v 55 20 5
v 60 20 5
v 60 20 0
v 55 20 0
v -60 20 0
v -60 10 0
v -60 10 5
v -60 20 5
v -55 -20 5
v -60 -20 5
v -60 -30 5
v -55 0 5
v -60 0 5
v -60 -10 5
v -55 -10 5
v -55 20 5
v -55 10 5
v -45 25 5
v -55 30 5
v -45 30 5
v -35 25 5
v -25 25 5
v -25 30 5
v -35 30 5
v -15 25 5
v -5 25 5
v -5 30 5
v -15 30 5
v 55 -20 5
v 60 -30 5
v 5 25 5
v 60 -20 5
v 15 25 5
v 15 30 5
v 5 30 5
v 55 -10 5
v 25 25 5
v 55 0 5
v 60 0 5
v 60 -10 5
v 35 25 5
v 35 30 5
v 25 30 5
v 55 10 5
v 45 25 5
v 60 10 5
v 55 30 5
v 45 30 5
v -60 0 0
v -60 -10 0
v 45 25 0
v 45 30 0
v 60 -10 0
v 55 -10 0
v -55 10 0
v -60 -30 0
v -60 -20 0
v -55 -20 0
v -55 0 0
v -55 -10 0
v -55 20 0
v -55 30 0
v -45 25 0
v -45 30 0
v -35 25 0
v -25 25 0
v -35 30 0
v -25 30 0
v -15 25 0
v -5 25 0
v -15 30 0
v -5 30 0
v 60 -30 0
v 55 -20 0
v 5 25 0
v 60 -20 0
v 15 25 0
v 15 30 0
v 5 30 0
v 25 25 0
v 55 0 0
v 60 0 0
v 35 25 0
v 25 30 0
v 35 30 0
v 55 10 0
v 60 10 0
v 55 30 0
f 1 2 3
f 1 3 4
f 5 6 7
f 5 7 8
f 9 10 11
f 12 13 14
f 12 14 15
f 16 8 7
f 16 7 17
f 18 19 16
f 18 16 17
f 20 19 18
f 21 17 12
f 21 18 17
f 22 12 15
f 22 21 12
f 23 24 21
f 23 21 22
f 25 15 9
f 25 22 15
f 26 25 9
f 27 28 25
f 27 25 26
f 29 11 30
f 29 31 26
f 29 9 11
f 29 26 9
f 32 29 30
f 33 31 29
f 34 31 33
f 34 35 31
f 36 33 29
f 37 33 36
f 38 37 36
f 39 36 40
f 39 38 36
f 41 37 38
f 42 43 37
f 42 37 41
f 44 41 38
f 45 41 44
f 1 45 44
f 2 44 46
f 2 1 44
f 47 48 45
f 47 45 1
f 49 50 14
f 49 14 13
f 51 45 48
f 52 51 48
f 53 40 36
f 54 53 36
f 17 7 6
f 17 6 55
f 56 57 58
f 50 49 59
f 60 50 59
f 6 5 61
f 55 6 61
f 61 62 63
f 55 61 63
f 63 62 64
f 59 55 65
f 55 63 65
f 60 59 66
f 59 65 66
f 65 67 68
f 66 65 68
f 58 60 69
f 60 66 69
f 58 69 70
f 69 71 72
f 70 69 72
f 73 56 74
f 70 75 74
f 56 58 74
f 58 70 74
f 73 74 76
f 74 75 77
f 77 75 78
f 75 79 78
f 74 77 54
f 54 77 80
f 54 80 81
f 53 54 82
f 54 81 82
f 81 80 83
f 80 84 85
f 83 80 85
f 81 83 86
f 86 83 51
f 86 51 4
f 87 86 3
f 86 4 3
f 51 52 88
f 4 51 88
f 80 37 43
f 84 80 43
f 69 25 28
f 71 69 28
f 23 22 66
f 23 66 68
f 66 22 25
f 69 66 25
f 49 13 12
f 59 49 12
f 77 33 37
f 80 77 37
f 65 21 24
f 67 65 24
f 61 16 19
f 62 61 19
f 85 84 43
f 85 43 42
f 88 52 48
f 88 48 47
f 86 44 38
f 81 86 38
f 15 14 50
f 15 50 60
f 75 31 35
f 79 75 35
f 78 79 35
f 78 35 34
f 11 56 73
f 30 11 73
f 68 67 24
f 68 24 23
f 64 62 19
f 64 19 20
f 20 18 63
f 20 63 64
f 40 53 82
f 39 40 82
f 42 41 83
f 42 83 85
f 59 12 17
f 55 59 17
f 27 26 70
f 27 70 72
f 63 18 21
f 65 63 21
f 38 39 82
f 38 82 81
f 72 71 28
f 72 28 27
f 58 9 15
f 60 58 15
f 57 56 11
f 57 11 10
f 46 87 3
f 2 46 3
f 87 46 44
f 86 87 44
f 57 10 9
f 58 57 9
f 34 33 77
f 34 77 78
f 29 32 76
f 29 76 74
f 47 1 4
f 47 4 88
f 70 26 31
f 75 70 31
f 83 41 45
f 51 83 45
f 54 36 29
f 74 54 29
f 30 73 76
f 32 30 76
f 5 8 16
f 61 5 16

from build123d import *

# Parameters (mm, degrees)
SKETCH_1_W               = 120
SKETCH_1_H               = 60
EXTRUDE_1_DEPTH          = 5
CUT_EXTRUDE_1_REACH      = 69.268
SKETCH_2_W               = 5
SKETCH_2_H               = 10
PATTERN_LINEAR_1_COUNT   = 3
PATTERN_LINEAR_1_PITCH   = 20
MIRROR_1_COPY_1_REACH    = 69.268
MIRROR_1_COPY_1_SKETCH_W = 5
MIRROR_1_COPY_1_SKETCH_H = 10
MIRROR_1_COPY_2_REACH    = 69.268
MIRROR_1_COPY_2_SKETCH_W = 5
MIRROR_1_COPY_2_SKETCH_H = 10
CUT_EXTRUDE_2_REACH      = 69.268
SKETCH_3_W               = 10
SKETCH_3_H               = 5
PATTERN_LINEAR_2_COUNT   = 3
PATTERN_LINEAR_2_PITCH   = 20
PATTERN_LINEAR_3_COUNT   = 3
PATTERN_LINEAR_3_PITCH   = 20


with BuildPart() as part:
    # 스케치1 → 보스-돌출1 (new body)
    with BuildSketch(Plane.XY):
        Rectangle(SKETCH_1_W, SKETCH_1_H)
    extrude(amount=EXTRUDE_1_DEPTH)

    # 스케치2 → 컷-돌출1 (cut, up to next)
    with BuildSketch(Plane.XY.offset(5), mode=Mode.PRIVATE) as cut_extrude_1_sk1:
        with Locations((-57.5, 25)):
            Rectangle(SKETCH_2_W, SKETCH_2_H)
    cut_extrude_1_tool1 = extrude(cut_extrude_1_sk1.sketch, amount=-CUT_EXTRUDE_1_REACH, mode=Mode.PRIVATE) & part.part
    cut_extrude_1 = cut_extrude_1_tool1.solids().sort_by_distance((-57.5, 25, 5))[0]
    add(cut_extrude_1, mode=Mode.SUBTRACT)

    # 선형 패턴1: 컷-돌출1 ×3
    with Locations(*[(0, -i * PATTERN_LINEAR_1_PITCH, 0) for i in range(1, PATTERN_LINEAR_1_COUNT)]):
        add(cut_extrude_1, mode=Mode.SUBTRACT)

    # 대칭 복사1: 컷-돌출1 across plane
    add(cut_extrude_1.mirror(Plane(origin=(0, 0, 0), x_dir=(0, 0, 1), z_dir=(1, 0, 0))), mode=Mode.SUBTRACT)

    # 대칭 복사1 copy 1 sketch → 대칭 복사1 copy 1 (cut, up to next)
    with BuildSketch(Plane(origin=(0, -20, 5), x_dir=(-1, 0, 0), z_dir=(0, 0, 1)), mode=Mode.PRIVATE) as mirror_1_copy_1_sk1:
        with Locations((-57.5, -25)):
            Rectangle(MIRROR_1_COPY_1_SKETCH_W, MIRROR_1_COPY_1_SKETCH_H)
    mirror_1_copy_1_tool1 = extrude(mirror_1_copy_1_sk1.sketch, amount=-MIRROR_1_COPY_1_REACH, mode=Mode.PRIVATE) & part.part
    add(mirror_1_copy_1_tool1.solids().sort_by_distance((57.5, 5, 5))[0], mode=Mode.SUBTRACT)

    # 대칭 복사1 copy 2 sketch → 대칭 복사1 copy 2 (cut, up to next)
    with BuildSketch(Plane(origin=(0, -40, 5), x_dir=(-1, 0, 0), z_dir=(0, 0, 1)), mode=Mode.PRIVATE) as mirror_1_copy_2_sk1:
        with Locations((-57.5, -25)):
            Rectangle(MIRROR_1_COPY_2_SKETCH_W, MIRROR_1_COPY_2_SKETCH_H)
    mirror_1_copy_2_tool1 = extrude(mirror_1_copy_2_sk1.sketch, amount=-MIRROR_1_COPY_2_REACH, mode=Mode.PRIVATE) & part.part
    add(mirror_1_copy_2_tool1.solids().sort_by_distance((57.5, -15, 5))[0], mode=Mode.SUBTRACT)

    # 스케치3 → 컷-돌출2 (cut, up to next)
    with BuildSketch(Plane.XY.offset(5), mode=Mode.PRIVATE) as cut_extrude_2_sk1:
        with Locations((0, 27.5)):
            Rectangle(SKETCH_3_W, SKETCH_3_H)
    cut_extrude_2_tool1 = extrude(cut_extrude_2_sk1.sketch, amount=-CUT_EXTRUDE_2_REACH, mode=Mode.PRIVATE) & part.part
    cut_extrude_2 = cut_extrude_2_tool1.solids().sort_by_distance((0, 27.5, 5))[0]
    add(cut_extrude_2, mode=Mode.SUBTRACT)

    # 선형 패턴2: 컷-돌출2 ×3
    with Locations(*[(-i * PATTERN_LINEAR_2_PITCH, 0, 0) for i in range(1, PATTERN_LINEAR_2_COUNT)]):
        add(cut_extrude_2, mode=Mode.SUBTRACT)

    # 선형 패턴3: 컷-돌출2 ×3
    with Locations(*[(i * PATTERN_LINEAR_3_PITCH, 0, 0) for i in range(1, PATTERN_LINEAR_3_COUNT)]):
        add(cut_extrude_2, mode=Mode.SUBTRACT)


solid = part.part
